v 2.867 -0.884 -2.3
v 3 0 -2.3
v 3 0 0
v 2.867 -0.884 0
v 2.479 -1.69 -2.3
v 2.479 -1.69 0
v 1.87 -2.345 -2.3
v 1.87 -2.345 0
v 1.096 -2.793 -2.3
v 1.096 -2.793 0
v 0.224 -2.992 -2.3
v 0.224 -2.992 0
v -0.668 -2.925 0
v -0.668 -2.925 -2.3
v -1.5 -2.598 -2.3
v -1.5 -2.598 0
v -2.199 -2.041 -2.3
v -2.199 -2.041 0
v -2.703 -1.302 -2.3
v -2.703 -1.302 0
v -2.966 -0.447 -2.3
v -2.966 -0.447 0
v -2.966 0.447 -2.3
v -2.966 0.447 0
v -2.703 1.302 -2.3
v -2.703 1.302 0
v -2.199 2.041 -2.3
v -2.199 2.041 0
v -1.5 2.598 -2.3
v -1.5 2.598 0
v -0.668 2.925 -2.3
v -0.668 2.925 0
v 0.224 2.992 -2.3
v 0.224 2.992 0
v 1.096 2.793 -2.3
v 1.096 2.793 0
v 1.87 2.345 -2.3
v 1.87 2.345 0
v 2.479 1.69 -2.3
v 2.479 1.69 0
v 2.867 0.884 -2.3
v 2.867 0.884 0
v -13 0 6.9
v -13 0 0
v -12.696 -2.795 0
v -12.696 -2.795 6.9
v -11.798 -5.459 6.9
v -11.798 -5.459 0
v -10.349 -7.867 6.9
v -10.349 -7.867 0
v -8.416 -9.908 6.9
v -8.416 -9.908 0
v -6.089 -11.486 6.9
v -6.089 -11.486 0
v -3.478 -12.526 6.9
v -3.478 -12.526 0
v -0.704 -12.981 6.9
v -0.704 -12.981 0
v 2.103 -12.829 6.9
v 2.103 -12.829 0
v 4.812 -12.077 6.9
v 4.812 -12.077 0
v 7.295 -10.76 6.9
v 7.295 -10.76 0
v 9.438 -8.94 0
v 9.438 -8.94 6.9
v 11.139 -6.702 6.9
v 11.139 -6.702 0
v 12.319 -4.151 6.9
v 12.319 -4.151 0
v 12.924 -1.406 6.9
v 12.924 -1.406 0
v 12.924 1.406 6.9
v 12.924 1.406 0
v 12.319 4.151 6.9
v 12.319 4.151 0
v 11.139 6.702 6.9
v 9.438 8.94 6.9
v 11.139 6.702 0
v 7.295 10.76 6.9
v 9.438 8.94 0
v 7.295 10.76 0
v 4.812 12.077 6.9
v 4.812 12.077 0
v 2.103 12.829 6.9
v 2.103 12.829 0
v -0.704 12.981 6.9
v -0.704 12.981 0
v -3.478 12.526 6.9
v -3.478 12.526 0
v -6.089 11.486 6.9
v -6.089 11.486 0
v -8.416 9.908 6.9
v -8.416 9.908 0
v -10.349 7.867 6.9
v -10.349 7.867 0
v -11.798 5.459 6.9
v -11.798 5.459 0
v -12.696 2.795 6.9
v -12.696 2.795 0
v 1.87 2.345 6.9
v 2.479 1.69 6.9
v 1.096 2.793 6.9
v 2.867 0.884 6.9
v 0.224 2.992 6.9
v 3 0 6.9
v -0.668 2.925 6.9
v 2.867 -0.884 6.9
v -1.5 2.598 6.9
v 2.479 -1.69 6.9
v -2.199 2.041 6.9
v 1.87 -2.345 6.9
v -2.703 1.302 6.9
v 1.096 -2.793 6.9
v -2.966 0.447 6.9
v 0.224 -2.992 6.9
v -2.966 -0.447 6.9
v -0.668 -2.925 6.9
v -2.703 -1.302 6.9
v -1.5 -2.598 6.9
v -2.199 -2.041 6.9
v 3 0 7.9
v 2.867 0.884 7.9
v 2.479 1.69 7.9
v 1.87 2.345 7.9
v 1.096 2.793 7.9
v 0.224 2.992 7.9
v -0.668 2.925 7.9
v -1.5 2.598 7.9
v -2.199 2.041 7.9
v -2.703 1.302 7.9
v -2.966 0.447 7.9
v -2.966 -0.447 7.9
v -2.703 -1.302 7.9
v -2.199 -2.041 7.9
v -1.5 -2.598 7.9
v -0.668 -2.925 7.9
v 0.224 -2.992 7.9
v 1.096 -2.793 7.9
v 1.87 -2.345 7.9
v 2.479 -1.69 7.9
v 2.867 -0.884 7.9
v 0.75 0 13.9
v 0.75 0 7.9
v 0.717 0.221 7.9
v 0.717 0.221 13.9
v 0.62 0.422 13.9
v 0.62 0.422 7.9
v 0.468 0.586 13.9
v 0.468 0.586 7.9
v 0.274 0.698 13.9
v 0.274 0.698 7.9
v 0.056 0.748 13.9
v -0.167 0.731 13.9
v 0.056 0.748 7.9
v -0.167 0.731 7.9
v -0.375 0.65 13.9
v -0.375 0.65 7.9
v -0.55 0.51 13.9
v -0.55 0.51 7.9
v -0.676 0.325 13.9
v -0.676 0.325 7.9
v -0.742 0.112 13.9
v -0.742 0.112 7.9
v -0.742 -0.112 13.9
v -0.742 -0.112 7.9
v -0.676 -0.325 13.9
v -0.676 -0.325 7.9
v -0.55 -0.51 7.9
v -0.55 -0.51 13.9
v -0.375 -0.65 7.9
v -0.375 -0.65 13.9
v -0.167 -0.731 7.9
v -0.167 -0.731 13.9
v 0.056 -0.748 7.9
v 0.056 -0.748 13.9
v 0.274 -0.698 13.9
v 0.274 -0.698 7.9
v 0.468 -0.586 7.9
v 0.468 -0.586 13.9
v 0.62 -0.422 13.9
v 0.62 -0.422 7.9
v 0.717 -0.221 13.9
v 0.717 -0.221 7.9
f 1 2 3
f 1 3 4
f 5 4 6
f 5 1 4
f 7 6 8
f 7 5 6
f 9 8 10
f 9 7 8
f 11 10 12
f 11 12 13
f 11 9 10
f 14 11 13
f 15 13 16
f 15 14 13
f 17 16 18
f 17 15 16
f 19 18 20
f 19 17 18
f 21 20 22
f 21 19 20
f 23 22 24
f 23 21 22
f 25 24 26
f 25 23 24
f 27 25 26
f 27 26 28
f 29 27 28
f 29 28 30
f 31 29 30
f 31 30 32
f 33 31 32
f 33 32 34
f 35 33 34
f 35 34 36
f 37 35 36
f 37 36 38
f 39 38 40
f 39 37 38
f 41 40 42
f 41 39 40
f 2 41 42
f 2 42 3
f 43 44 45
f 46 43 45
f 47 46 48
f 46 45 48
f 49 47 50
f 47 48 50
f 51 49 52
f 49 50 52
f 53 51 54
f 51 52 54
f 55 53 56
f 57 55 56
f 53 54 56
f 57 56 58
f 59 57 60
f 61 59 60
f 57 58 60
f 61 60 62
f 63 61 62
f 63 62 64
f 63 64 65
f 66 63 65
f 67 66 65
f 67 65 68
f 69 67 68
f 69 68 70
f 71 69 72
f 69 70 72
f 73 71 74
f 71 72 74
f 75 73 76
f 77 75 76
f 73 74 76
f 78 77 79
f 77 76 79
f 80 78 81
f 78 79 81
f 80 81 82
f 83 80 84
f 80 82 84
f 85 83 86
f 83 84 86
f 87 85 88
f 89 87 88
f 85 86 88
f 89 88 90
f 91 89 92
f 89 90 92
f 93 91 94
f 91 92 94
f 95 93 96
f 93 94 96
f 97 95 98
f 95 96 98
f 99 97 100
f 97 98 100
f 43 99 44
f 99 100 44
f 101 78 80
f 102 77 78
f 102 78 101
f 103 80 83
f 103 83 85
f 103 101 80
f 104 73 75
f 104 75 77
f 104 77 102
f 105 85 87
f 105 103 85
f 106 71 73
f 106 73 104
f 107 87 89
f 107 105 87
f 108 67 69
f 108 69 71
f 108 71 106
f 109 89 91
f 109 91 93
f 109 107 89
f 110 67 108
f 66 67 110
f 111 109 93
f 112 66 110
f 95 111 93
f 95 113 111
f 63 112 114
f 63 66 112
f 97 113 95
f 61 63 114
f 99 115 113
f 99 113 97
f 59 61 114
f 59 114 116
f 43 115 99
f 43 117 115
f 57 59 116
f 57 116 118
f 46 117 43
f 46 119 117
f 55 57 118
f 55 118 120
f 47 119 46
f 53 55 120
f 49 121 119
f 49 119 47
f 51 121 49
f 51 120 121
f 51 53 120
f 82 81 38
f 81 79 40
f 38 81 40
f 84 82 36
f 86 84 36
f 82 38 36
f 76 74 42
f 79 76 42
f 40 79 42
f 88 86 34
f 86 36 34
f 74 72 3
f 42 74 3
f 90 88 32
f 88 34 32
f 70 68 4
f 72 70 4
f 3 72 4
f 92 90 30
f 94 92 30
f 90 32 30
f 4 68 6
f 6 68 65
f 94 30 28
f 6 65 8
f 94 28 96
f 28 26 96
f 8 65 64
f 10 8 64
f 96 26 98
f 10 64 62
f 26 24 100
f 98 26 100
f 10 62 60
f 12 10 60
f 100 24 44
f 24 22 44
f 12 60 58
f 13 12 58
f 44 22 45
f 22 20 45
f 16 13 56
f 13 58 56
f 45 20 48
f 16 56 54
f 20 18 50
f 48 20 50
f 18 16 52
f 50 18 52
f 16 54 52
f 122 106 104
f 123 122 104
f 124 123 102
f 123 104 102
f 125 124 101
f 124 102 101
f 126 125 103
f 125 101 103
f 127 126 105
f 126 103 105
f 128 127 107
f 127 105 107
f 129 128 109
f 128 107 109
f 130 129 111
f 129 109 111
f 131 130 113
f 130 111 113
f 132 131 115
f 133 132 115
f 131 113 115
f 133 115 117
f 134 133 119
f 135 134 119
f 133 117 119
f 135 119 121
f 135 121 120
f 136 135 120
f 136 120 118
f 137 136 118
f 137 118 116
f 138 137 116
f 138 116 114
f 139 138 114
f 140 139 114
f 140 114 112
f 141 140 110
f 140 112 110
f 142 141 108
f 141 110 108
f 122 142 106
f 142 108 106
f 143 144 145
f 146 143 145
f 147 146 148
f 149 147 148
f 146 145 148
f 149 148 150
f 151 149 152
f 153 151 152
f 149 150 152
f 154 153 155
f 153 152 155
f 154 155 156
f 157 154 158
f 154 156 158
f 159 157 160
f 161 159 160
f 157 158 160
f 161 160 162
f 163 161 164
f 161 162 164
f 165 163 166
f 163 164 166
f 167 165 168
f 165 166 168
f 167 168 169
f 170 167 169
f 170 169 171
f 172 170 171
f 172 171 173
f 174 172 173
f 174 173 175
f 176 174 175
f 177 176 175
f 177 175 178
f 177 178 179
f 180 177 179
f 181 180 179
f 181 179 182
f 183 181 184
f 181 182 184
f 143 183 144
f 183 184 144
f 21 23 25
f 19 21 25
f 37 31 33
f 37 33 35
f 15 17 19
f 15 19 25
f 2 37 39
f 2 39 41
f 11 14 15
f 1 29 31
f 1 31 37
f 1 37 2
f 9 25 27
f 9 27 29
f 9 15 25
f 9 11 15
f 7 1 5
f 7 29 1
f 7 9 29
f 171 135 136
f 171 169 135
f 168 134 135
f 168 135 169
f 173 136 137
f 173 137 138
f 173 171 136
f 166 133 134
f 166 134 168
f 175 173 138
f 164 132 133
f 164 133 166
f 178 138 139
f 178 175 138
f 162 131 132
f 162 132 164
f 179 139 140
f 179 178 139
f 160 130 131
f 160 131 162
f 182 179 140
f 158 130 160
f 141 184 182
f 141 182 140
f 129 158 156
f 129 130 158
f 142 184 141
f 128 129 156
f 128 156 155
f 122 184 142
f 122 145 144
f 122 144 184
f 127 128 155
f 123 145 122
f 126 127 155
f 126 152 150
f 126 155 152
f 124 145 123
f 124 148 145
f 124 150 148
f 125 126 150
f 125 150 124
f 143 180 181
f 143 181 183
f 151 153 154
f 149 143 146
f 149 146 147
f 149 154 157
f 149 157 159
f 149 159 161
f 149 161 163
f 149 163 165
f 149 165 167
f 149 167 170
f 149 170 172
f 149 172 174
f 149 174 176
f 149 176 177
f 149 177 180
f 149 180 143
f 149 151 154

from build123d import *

# Parameters (mm, degrees)
ESQUISSE1_R        = 13
BOSS_EXTRU_1_DEPTH = 6.9
ESQUISSE2_R        = 3
BOSS_EXTRU_2_DEPTH = 1
ESQUISSE3_R        = 0.75
BOSS_EXTRU_3_DEPTH = 6
BOSS_EXTRU_4_START = 2.3
ESQUISSE4_R        = 3
BOSS_EXTRU_4_DEPTH = 2.3


with BuildPart() as part:
    # Esquisse1 → Boss.-Extru.1 (new body)
    with BuildSketch(Plane.XY):
        with Locations(Location((0, 0, 0), (0, 0, 180))):
            Circle(ESQUISSE1_R)
    extrude(amount=BOSS_EXTRU_1_DEPTH)

    # Esquisse2 → Boss.-Extru.2 (add)
    with BuildSketch(Plane.XY.offset(6.9)):
        Circle(ESQUISSE2_R)
    extrude(amount=BOSS_EXTRU_2_DEPTH)

    # Esquisse3 → Boss.-Extru.3 (add)
    with BuildSketch(Plane.XY.offset(7.9)):
        Circle(ESQUISSE3_R)
    extrude(amount=BOSS_EXTRU_3_DEPTH)

    # Esquisse4 → Boss.-Extru.4 (add)
    with BuildSketch(Plane(origin=(0, 0, 0), x_dir=(-1, 0, 0), z_dir=(0, 0, -1)).offset(BOSS_EXTRU_4_START)):
        with Locations(Location((0, 0, 0), (0, 0, 180))):
            Circle(ESQUISSE4_R)
    extrude(amount=-BOSS_EXTRU_4_DEPTH)


solid = part.part
